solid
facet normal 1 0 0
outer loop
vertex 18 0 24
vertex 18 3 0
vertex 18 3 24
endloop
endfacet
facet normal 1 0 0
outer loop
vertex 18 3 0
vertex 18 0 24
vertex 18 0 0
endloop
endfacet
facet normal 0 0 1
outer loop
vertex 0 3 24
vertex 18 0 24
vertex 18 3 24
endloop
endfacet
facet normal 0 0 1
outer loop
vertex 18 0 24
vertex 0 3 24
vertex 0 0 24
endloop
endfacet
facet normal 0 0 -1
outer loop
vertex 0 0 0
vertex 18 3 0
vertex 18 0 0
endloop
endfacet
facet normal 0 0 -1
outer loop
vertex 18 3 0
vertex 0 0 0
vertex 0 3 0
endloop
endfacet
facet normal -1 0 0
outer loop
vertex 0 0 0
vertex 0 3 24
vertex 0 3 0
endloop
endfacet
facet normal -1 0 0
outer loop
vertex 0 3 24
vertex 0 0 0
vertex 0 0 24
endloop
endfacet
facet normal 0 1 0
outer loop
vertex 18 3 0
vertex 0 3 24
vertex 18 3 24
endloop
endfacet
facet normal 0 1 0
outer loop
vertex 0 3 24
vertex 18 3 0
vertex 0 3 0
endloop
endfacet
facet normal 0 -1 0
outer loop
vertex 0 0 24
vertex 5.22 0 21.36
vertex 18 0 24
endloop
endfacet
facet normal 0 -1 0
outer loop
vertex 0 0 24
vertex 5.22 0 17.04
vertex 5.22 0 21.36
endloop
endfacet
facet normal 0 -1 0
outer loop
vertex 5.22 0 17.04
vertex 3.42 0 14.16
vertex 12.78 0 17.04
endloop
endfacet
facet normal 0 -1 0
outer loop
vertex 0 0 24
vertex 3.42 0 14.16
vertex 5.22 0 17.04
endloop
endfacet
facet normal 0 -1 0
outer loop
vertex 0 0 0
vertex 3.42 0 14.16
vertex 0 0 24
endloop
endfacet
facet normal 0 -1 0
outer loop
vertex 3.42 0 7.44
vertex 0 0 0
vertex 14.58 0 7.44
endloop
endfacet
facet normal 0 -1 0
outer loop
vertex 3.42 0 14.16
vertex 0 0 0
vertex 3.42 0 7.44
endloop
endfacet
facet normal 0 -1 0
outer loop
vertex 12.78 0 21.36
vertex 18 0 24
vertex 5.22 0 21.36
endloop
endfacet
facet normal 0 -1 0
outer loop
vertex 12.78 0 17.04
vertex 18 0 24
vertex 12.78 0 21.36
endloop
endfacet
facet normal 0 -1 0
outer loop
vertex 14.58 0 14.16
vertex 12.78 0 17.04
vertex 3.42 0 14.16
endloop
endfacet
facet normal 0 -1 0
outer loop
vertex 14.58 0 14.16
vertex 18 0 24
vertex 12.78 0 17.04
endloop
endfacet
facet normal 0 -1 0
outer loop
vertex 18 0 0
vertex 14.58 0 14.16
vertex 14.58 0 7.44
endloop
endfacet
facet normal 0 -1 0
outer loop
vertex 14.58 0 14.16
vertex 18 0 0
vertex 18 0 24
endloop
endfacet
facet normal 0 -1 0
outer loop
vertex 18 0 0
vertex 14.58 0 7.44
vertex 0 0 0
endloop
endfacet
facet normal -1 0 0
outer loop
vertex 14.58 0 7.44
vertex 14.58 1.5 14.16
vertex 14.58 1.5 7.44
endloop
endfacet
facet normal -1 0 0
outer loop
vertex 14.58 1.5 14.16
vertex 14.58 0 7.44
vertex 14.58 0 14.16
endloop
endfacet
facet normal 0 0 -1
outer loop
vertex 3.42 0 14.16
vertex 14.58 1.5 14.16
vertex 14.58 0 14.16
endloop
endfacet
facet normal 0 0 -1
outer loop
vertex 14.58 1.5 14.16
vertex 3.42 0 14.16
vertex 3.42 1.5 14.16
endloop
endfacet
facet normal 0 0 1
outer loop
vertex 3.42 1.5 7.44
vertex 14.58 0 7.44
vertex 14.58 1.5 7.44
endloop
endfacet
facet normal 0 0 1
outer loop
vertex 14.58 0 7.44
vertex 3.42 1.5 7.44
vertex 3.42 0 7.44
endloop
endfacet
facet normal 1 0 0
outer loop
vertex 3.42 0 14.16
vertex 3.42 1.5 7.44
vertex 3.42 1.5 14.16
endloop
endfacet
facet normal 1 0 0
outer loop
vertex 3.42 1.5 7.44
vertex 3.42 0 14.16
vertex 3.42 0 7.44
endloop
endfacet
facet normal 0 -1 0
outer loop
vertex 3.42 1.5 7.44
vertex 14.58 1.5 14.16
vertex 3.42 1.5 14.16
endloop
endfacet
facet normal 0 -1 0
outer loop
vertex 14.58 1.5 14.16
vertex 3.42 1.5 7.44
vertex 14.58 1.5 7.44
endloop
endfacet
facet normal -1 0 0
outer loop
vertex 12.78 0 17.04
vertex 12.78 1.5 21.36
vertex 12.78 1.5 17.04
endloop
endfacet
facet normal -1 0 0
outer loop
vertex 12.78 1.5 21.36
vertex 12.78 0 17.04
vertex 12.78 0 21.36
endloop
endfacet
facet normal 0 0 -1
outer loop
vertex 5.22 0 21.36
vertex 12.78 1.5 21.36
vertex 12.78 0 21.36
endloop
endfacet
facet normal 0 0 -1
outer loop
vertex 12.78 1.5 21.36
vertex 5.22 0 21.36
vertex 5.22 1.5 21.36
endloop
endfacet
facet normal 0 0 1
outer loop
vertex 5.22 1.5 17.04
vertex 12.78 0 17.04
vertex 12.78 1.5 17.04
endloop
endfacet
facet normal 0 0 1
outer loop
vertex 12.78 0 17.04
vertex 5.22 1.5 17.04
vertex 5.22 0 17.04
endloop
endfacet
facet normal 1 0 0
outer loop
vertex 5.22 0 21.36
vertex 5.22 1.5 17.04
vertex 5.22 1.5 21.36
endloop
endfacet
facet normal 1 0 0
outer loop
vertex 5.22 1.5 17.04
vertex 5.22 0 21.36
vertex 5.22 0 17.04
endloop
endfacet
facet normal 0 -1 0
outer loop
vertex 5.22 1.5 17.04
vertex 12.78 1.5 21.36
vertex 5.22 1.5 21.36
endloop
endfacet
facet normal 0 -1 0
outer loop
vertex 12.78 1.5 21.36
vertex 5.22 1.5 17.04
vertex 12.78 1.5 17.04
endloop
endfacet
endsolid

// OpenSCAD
// DIN-rail retaining clip.
$fn = 60;
eps = 0.02;
clip_w = 18;
clip_h = 24;
clip_t = 3;
difference() { cube([clip_w,clip_t,clip_h]); translate([clip_w/2, -eps, clip_h*0.45]) cube([clip_w*0.62,clip_t+2*eps,clip_h*0.28],center=true); translate([clip_w/2, -eps, clip_h*0.8]) cube([clip_w*0.42,clip_t+2*eps,clip_h*0.18],center=true); }
